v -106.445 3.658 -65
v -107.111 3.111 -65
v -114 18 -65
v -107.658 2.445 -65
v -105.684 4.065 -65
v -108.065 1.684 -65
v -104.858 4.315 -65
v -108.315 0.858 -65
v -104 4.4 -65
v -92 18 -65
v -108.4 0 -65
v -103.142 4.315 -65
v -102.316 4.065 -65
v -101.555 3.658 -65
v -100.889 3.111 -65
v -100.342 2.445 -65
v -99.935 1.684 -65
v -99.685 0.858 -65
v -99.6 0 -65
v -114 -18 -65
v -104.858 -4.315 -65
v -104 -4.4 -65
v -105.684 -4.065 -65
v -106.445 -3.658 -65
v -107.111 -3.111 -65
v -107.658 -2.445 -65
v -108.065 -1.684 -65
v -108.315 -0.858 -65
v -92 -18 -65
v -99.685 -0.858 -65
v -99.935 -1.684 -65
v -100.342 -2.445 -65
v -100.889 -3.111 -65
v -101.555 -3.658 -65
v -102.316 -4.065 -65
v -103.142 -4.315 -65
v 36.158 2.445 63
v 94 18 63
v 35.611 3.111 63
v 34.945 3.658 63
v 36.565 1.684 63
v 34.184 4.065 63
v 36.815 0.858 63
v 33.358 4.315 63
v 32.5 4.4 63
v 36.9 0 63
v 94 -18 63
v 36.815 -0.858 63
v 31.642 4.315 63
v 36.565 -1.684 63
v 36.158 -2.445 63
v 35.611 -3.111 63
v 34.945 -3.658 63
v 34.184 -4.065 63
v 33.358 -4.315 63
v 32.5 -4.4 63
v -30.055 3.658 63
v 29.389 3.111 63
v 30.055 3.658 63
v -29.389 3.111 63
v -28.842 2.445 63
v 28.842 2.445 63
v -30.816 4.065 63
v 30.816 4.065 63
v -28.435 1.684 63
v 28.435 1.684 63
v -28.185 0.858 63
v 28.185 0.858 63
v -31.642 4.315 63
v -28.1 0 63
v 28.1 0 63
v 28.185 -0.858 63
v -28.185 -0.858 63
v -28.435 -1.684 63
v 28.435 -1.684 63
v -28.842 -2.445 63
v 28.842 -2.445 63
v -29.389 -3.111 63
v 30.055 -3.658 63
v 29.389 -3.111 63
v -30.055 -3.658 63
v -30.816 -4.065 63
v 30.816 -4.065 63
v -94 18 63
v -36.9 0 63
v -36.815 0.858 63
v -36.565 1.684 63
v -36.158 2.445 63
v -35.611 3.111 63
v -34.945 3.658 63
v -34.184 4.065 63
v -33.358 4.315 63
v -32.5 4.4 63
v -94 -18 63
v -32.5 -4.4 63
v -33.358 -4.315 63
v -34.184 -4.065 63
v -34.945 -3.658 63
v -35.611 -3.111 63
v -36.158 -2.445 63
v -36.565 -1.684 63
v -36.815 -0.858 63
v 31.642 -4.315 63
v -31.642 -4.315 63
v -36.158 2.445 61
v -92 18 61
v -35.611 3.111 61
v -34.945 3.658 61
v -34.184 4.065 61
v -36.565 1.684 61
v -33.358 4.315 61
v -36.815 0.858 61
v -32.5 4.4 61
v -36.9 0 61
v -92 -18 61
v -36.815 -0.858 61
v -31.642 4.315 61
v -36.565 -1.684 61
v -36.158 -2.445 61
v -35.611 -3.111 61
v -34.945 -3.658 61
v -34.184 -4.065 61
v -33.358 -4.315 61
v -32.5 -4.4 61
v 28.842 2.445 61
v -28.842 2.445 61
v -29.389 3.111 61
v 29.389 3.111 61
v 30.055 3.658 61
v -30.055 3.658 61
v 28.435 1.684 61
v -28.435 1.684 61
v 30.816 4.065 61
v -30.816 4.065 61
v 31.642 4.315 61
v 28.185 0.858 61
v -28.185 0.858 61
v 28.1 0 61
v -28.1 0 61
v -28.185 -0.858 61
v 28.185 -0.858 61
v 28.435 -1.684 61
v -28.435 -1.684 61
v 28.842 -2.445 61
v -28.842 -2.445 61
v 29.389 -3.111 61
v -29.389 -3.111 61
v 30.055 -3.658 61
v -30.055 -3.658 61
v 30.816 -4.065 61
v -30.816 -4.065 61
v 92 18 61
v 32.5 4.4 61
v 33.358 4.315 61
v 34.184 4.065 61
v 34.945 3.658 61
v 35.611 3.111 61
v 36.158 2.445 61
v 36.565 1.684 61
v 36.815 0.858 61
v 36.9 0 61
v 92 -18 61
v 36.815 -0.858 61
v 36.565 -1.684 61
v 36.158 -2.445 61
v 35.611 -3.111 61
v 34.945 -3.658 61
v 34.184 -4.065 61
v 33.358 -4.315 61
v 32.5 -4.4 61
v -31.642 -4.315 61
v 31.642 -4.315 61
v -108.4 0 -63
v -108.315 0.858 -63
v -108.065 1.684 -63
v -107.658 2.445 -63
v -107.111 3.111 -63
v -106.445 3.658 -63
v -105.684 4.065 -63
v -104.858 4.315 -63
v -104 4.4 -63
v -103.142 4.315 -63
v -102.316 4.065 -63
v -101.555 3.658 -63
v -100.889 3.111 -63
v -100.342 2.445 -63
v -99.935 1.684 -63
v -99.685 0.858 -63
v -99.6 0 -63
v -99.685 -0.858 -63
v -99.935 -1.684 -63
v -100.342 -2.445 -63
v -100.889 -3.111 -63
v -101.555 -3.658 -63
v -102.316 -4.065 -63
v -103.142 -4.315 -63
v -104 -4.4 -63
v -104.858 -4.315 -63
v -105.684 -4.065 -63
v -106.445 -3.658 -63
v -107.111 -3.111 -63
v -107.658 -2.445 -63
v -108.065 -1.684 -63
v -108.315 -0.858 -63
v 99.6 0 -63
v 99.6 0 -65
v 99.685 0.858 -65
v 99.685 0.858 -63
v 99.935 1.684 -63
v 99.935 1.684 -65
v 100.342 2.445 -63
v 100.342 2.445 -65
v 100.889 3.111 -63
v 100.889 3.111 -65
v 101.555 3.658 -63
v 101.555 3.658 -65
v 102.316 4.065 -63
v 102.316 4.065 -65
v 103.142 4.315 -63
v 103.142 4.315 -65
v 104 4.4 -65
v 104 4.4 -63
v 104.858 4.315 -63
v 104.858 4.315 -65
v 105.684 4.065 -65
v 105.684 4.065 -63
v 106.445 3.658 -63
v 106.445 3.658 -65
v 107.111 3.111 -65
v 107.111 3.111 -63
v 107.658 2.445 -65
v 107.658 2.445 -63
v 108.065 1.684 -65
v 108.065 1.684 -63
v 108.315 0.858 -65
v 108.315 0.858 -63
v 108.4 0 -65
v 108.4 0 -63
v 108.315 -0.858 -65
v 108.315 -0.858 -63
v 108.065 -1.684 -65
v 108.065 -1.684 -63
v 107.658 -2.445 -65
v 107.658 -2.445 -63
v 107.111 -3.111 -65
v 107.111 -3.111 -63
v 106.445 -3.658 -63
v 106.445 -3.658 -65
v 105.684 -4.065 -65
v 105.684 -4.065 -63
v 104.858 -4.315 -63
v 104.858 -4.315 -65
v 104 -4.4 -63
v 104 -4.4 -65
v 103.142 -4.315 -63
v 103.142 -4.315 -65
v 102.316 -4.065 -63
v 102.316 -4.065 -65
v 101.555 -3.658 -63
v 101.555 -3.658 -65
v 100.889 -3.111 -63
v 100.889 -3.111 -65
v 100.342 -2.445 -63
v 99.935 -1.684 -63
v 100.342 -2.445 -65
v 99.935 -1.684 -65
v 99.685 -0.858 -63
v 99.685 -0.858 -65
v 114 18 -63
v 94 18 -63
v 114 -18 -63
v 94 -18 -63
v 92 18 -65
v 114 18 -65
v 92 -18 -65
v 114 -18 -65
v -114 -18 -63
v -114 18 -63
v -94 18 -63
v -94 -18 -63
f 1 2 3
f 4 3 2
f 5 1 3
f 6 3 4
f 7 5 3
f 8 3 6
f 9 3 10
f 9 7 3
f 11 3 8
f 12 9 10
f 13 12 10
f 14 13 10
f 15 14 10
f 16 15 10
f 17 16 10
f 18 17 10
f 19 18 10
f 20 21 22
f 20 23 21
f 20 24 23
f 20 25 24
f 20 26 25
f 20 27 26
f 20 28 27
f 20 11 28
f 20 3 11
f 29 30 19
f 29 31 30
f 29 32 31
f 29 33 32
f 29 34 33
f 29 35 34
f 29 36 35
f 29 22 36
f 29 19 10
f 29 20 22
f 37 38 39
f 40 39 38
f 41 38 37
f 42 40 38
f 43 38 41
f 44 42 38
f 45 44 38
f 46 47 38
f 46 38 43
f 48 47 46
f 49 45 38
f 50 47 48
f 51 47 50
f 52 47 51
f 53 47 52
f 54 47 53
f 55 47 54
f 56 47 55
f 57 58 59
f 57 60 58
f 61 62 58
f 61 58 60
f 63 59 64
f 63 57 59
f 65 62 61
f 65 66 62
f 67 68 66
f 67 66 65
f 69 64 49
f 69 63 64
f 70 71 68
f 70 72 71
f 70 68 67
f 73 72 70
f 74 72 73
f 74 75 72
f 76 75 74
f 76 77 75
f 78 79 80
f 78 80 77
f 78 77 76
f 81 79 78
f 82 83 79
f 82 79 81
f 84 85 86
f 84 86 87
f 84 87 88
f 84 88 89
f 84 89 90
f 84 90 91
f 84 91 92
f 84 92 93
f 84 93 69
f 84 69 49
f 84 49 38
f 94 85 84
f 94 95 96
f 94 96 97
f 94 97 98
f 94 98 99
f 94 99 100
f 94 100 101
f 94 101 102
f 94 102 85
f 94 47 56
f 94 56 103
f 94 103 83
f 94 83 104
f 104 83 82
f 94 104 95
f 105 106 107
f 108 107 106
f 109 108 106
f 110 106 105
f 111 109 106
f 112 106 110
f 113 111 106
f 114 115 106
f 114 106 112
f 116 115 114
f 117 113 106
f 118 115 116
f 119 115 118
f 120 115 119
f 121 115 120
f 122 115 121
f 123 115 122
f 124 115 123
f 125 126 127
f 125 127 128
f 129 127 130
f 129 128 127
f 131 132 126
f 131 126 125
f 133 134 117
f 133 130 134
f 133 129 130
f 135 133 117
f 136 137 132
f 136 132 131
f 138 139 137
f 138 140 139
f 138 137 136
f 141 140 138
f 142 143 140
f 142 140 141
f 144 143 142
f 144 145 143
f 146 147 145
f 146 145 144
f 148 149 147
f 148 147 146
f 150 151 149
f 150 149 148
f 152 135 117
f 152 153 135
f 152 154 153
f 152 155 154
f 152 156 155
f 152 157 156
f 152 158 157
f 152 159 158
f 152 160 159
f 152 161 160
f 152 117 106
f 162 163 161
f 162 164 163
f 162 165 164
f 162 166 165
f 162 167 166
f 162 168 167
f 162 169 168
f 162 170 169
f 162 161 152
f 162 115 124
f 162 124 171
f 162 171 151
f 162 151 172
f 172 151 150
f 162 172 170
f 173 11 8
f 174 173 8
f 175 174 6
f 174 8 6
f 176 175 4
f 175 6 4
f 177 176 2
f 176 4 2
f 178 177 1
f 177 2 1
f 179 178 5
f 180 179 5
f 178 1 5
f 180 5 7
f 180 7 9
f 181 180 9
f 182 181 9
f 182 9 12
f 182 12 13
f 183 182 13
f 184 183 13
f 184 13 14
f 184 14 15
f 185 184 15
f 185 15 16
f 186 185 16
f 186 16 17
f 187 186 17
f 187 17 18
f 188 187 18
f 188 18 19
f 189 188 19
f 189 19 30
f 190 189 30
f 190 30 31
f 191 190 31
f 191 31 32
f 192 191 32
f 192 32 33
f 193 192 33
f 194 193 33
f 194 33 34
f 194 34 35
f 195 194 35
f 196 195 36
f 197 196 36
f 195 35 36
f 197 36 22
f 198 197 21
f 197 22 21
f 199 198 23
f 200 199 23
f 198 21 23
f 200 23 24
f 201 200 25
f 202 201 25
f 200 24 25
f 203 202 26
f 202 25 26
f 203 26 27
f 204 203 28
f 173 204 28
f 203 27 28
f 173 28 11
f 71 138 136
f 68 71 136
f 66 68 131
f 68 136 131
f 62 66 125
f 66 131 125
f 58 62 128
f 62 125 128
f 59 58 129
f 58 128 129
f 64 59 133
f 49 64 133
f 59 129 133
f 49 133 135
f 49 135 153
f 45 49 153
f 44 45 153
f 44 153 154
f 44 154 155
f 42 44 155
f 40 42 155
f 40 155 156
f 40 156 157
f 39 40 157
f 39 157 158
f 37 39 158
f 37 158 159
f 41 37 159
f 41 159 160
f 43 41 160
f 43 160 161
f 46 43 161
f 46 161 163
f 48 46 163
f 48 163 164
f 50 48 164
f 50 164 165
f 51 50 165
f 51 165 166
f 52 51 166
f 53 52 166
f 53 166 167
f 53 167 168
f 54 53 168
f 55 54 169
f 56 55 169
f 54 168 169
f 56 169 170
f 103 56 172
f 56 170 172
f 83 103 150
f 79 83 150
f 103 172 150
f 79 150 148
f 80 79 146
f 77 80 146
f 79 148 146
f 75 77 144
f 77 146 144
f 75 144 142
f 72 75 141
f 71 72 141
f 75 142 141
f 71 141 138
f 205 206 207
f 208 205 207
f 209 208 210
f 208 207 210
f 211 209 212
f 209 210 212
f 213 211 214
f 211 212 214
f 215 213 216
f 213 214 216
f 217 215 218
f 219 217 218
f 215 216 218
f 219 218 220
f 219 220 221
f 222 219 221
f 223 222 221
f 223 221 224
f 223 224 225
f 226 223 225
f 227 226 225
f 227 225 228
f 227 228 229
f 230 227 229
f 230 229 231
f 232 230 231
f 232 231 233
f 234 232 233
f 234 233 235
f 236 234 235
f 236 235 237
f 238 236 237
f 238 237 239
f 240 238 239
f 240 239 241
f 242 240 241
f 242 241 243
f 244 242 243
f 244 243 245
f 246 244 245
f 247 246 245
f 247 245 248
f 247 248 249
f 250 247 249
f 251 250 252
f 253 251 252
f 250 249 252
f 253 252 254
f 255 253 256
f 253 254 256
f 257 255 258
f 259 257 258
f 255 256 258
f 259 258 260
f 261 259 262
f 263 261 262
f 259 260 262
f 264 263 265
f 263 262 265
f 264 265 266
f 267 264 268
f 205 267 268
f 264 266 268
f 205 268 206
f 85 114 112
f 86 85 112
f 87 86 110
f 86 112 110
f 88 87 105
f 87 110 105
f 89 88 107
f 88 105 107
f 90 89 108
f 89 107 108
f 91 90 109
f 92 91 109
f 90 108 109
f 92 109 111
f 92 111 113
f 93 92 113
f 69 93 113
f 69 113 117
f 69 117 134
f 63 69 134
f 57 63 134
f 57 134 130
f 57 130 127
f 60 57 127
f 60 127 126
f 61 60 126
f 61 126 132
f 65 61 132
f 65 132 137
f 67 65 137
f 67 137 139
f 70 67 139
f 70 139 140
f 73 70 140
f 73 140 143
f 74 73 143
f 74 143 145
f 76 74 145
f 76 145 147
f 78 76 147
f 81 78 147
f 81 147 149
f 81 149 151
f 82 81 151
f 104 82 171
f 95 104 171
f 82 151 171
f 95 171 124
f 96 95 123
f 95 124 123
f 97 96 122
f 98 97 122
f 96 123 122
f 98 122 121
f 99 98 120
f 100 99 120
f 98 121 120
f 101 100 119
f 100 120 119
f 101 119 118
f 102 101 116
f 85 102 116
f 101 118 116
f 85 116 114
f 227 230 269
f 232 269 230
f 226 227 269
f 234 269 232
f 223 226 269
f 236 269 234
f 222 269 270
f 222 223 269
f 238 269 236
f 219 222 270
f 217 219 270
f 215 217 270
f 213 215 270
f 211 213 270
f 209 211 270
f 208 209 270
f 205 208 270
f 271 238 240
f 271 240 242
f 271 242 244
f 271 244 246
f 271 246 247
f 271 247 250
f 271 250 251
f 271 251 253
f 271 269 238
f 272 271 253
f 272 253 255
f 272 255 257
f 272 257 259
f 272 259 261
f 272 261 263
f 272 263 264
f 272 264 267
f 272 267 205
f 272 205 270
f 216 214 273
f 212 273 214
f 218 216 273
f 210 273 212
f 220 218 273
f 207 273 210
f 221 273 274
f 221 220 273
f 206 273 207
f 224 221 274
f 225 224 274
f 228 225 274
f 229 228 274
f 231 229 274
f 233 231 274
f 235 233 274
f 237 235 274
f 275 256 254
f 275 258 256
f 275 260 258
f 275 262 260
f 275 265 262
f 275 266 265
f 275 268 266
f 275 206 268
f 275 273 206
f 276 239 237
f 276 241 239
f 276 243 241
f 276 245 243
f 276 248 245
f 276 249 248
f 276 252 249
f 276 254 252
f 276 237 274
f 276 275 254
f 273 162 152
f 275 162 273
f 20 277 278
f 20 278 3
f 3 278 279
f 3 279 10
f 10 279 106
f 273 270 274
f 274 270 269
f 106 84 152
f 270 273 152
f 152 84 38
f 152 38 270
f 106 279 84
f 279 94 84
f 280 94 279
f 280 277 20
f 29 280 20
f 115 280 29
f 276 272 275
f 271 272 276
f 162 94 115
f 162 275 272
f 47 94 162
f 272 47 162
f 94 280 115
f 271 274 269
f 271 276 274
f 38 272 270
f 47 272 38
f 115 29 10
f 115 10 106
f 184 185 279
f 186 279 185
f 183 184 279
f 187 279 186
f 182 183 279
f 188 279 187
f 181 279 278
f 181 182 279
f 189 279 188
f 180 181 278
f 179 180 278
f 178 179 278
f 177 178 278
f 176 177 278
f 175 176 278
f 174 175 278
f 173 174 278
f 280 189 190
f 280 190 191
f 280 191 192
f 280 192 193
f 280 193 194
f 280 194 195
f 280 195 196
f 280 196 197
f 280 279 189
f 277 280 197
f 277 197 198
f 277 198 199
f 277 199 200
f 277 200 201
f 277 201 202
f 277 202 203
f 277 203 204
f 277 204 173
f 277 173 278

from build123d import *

# Parameters (mm, degrees)
F1_DEPTH   = 18
F5_D       = 8.8
F5_ON_F4_D = 8.8
F5_ON_F3_D = 8.8


with BuildPart() as f1:
    # F0 (on Front) → F1 (new body, symmetric)
    with BuildSketch(Plane.XZ):
        Polygon((94, -63), (94, 63), (-94, 63), (-94, -63), (-114, -63), (-114, -65), (-92, -65), (-92, 61), (92, 61), (92, -65), (114, -65), (114, -63), align=None)
    extrude(amount=F1_DEPTH, both=True)

    # F5 (through all)
    with Locations(Plane.XY.offset(63)):
        with Locations((-32.5, 0), (32.5, 0)):
            Hole(F5_D / 2)

    # F5 on F4 (through all)
    with Locations(Plane.XY.offset(-63)):
        with Locations((104, 0)):
            Hole(F5_ON_F4_D / 2)

    # F5 on F3 (through all)
    with Locations(Plane.XY.offset(-63)):
        with Locations((-104, 0)):
            Hole(F5_ON_F3_D / 2)


solid = f1.part
